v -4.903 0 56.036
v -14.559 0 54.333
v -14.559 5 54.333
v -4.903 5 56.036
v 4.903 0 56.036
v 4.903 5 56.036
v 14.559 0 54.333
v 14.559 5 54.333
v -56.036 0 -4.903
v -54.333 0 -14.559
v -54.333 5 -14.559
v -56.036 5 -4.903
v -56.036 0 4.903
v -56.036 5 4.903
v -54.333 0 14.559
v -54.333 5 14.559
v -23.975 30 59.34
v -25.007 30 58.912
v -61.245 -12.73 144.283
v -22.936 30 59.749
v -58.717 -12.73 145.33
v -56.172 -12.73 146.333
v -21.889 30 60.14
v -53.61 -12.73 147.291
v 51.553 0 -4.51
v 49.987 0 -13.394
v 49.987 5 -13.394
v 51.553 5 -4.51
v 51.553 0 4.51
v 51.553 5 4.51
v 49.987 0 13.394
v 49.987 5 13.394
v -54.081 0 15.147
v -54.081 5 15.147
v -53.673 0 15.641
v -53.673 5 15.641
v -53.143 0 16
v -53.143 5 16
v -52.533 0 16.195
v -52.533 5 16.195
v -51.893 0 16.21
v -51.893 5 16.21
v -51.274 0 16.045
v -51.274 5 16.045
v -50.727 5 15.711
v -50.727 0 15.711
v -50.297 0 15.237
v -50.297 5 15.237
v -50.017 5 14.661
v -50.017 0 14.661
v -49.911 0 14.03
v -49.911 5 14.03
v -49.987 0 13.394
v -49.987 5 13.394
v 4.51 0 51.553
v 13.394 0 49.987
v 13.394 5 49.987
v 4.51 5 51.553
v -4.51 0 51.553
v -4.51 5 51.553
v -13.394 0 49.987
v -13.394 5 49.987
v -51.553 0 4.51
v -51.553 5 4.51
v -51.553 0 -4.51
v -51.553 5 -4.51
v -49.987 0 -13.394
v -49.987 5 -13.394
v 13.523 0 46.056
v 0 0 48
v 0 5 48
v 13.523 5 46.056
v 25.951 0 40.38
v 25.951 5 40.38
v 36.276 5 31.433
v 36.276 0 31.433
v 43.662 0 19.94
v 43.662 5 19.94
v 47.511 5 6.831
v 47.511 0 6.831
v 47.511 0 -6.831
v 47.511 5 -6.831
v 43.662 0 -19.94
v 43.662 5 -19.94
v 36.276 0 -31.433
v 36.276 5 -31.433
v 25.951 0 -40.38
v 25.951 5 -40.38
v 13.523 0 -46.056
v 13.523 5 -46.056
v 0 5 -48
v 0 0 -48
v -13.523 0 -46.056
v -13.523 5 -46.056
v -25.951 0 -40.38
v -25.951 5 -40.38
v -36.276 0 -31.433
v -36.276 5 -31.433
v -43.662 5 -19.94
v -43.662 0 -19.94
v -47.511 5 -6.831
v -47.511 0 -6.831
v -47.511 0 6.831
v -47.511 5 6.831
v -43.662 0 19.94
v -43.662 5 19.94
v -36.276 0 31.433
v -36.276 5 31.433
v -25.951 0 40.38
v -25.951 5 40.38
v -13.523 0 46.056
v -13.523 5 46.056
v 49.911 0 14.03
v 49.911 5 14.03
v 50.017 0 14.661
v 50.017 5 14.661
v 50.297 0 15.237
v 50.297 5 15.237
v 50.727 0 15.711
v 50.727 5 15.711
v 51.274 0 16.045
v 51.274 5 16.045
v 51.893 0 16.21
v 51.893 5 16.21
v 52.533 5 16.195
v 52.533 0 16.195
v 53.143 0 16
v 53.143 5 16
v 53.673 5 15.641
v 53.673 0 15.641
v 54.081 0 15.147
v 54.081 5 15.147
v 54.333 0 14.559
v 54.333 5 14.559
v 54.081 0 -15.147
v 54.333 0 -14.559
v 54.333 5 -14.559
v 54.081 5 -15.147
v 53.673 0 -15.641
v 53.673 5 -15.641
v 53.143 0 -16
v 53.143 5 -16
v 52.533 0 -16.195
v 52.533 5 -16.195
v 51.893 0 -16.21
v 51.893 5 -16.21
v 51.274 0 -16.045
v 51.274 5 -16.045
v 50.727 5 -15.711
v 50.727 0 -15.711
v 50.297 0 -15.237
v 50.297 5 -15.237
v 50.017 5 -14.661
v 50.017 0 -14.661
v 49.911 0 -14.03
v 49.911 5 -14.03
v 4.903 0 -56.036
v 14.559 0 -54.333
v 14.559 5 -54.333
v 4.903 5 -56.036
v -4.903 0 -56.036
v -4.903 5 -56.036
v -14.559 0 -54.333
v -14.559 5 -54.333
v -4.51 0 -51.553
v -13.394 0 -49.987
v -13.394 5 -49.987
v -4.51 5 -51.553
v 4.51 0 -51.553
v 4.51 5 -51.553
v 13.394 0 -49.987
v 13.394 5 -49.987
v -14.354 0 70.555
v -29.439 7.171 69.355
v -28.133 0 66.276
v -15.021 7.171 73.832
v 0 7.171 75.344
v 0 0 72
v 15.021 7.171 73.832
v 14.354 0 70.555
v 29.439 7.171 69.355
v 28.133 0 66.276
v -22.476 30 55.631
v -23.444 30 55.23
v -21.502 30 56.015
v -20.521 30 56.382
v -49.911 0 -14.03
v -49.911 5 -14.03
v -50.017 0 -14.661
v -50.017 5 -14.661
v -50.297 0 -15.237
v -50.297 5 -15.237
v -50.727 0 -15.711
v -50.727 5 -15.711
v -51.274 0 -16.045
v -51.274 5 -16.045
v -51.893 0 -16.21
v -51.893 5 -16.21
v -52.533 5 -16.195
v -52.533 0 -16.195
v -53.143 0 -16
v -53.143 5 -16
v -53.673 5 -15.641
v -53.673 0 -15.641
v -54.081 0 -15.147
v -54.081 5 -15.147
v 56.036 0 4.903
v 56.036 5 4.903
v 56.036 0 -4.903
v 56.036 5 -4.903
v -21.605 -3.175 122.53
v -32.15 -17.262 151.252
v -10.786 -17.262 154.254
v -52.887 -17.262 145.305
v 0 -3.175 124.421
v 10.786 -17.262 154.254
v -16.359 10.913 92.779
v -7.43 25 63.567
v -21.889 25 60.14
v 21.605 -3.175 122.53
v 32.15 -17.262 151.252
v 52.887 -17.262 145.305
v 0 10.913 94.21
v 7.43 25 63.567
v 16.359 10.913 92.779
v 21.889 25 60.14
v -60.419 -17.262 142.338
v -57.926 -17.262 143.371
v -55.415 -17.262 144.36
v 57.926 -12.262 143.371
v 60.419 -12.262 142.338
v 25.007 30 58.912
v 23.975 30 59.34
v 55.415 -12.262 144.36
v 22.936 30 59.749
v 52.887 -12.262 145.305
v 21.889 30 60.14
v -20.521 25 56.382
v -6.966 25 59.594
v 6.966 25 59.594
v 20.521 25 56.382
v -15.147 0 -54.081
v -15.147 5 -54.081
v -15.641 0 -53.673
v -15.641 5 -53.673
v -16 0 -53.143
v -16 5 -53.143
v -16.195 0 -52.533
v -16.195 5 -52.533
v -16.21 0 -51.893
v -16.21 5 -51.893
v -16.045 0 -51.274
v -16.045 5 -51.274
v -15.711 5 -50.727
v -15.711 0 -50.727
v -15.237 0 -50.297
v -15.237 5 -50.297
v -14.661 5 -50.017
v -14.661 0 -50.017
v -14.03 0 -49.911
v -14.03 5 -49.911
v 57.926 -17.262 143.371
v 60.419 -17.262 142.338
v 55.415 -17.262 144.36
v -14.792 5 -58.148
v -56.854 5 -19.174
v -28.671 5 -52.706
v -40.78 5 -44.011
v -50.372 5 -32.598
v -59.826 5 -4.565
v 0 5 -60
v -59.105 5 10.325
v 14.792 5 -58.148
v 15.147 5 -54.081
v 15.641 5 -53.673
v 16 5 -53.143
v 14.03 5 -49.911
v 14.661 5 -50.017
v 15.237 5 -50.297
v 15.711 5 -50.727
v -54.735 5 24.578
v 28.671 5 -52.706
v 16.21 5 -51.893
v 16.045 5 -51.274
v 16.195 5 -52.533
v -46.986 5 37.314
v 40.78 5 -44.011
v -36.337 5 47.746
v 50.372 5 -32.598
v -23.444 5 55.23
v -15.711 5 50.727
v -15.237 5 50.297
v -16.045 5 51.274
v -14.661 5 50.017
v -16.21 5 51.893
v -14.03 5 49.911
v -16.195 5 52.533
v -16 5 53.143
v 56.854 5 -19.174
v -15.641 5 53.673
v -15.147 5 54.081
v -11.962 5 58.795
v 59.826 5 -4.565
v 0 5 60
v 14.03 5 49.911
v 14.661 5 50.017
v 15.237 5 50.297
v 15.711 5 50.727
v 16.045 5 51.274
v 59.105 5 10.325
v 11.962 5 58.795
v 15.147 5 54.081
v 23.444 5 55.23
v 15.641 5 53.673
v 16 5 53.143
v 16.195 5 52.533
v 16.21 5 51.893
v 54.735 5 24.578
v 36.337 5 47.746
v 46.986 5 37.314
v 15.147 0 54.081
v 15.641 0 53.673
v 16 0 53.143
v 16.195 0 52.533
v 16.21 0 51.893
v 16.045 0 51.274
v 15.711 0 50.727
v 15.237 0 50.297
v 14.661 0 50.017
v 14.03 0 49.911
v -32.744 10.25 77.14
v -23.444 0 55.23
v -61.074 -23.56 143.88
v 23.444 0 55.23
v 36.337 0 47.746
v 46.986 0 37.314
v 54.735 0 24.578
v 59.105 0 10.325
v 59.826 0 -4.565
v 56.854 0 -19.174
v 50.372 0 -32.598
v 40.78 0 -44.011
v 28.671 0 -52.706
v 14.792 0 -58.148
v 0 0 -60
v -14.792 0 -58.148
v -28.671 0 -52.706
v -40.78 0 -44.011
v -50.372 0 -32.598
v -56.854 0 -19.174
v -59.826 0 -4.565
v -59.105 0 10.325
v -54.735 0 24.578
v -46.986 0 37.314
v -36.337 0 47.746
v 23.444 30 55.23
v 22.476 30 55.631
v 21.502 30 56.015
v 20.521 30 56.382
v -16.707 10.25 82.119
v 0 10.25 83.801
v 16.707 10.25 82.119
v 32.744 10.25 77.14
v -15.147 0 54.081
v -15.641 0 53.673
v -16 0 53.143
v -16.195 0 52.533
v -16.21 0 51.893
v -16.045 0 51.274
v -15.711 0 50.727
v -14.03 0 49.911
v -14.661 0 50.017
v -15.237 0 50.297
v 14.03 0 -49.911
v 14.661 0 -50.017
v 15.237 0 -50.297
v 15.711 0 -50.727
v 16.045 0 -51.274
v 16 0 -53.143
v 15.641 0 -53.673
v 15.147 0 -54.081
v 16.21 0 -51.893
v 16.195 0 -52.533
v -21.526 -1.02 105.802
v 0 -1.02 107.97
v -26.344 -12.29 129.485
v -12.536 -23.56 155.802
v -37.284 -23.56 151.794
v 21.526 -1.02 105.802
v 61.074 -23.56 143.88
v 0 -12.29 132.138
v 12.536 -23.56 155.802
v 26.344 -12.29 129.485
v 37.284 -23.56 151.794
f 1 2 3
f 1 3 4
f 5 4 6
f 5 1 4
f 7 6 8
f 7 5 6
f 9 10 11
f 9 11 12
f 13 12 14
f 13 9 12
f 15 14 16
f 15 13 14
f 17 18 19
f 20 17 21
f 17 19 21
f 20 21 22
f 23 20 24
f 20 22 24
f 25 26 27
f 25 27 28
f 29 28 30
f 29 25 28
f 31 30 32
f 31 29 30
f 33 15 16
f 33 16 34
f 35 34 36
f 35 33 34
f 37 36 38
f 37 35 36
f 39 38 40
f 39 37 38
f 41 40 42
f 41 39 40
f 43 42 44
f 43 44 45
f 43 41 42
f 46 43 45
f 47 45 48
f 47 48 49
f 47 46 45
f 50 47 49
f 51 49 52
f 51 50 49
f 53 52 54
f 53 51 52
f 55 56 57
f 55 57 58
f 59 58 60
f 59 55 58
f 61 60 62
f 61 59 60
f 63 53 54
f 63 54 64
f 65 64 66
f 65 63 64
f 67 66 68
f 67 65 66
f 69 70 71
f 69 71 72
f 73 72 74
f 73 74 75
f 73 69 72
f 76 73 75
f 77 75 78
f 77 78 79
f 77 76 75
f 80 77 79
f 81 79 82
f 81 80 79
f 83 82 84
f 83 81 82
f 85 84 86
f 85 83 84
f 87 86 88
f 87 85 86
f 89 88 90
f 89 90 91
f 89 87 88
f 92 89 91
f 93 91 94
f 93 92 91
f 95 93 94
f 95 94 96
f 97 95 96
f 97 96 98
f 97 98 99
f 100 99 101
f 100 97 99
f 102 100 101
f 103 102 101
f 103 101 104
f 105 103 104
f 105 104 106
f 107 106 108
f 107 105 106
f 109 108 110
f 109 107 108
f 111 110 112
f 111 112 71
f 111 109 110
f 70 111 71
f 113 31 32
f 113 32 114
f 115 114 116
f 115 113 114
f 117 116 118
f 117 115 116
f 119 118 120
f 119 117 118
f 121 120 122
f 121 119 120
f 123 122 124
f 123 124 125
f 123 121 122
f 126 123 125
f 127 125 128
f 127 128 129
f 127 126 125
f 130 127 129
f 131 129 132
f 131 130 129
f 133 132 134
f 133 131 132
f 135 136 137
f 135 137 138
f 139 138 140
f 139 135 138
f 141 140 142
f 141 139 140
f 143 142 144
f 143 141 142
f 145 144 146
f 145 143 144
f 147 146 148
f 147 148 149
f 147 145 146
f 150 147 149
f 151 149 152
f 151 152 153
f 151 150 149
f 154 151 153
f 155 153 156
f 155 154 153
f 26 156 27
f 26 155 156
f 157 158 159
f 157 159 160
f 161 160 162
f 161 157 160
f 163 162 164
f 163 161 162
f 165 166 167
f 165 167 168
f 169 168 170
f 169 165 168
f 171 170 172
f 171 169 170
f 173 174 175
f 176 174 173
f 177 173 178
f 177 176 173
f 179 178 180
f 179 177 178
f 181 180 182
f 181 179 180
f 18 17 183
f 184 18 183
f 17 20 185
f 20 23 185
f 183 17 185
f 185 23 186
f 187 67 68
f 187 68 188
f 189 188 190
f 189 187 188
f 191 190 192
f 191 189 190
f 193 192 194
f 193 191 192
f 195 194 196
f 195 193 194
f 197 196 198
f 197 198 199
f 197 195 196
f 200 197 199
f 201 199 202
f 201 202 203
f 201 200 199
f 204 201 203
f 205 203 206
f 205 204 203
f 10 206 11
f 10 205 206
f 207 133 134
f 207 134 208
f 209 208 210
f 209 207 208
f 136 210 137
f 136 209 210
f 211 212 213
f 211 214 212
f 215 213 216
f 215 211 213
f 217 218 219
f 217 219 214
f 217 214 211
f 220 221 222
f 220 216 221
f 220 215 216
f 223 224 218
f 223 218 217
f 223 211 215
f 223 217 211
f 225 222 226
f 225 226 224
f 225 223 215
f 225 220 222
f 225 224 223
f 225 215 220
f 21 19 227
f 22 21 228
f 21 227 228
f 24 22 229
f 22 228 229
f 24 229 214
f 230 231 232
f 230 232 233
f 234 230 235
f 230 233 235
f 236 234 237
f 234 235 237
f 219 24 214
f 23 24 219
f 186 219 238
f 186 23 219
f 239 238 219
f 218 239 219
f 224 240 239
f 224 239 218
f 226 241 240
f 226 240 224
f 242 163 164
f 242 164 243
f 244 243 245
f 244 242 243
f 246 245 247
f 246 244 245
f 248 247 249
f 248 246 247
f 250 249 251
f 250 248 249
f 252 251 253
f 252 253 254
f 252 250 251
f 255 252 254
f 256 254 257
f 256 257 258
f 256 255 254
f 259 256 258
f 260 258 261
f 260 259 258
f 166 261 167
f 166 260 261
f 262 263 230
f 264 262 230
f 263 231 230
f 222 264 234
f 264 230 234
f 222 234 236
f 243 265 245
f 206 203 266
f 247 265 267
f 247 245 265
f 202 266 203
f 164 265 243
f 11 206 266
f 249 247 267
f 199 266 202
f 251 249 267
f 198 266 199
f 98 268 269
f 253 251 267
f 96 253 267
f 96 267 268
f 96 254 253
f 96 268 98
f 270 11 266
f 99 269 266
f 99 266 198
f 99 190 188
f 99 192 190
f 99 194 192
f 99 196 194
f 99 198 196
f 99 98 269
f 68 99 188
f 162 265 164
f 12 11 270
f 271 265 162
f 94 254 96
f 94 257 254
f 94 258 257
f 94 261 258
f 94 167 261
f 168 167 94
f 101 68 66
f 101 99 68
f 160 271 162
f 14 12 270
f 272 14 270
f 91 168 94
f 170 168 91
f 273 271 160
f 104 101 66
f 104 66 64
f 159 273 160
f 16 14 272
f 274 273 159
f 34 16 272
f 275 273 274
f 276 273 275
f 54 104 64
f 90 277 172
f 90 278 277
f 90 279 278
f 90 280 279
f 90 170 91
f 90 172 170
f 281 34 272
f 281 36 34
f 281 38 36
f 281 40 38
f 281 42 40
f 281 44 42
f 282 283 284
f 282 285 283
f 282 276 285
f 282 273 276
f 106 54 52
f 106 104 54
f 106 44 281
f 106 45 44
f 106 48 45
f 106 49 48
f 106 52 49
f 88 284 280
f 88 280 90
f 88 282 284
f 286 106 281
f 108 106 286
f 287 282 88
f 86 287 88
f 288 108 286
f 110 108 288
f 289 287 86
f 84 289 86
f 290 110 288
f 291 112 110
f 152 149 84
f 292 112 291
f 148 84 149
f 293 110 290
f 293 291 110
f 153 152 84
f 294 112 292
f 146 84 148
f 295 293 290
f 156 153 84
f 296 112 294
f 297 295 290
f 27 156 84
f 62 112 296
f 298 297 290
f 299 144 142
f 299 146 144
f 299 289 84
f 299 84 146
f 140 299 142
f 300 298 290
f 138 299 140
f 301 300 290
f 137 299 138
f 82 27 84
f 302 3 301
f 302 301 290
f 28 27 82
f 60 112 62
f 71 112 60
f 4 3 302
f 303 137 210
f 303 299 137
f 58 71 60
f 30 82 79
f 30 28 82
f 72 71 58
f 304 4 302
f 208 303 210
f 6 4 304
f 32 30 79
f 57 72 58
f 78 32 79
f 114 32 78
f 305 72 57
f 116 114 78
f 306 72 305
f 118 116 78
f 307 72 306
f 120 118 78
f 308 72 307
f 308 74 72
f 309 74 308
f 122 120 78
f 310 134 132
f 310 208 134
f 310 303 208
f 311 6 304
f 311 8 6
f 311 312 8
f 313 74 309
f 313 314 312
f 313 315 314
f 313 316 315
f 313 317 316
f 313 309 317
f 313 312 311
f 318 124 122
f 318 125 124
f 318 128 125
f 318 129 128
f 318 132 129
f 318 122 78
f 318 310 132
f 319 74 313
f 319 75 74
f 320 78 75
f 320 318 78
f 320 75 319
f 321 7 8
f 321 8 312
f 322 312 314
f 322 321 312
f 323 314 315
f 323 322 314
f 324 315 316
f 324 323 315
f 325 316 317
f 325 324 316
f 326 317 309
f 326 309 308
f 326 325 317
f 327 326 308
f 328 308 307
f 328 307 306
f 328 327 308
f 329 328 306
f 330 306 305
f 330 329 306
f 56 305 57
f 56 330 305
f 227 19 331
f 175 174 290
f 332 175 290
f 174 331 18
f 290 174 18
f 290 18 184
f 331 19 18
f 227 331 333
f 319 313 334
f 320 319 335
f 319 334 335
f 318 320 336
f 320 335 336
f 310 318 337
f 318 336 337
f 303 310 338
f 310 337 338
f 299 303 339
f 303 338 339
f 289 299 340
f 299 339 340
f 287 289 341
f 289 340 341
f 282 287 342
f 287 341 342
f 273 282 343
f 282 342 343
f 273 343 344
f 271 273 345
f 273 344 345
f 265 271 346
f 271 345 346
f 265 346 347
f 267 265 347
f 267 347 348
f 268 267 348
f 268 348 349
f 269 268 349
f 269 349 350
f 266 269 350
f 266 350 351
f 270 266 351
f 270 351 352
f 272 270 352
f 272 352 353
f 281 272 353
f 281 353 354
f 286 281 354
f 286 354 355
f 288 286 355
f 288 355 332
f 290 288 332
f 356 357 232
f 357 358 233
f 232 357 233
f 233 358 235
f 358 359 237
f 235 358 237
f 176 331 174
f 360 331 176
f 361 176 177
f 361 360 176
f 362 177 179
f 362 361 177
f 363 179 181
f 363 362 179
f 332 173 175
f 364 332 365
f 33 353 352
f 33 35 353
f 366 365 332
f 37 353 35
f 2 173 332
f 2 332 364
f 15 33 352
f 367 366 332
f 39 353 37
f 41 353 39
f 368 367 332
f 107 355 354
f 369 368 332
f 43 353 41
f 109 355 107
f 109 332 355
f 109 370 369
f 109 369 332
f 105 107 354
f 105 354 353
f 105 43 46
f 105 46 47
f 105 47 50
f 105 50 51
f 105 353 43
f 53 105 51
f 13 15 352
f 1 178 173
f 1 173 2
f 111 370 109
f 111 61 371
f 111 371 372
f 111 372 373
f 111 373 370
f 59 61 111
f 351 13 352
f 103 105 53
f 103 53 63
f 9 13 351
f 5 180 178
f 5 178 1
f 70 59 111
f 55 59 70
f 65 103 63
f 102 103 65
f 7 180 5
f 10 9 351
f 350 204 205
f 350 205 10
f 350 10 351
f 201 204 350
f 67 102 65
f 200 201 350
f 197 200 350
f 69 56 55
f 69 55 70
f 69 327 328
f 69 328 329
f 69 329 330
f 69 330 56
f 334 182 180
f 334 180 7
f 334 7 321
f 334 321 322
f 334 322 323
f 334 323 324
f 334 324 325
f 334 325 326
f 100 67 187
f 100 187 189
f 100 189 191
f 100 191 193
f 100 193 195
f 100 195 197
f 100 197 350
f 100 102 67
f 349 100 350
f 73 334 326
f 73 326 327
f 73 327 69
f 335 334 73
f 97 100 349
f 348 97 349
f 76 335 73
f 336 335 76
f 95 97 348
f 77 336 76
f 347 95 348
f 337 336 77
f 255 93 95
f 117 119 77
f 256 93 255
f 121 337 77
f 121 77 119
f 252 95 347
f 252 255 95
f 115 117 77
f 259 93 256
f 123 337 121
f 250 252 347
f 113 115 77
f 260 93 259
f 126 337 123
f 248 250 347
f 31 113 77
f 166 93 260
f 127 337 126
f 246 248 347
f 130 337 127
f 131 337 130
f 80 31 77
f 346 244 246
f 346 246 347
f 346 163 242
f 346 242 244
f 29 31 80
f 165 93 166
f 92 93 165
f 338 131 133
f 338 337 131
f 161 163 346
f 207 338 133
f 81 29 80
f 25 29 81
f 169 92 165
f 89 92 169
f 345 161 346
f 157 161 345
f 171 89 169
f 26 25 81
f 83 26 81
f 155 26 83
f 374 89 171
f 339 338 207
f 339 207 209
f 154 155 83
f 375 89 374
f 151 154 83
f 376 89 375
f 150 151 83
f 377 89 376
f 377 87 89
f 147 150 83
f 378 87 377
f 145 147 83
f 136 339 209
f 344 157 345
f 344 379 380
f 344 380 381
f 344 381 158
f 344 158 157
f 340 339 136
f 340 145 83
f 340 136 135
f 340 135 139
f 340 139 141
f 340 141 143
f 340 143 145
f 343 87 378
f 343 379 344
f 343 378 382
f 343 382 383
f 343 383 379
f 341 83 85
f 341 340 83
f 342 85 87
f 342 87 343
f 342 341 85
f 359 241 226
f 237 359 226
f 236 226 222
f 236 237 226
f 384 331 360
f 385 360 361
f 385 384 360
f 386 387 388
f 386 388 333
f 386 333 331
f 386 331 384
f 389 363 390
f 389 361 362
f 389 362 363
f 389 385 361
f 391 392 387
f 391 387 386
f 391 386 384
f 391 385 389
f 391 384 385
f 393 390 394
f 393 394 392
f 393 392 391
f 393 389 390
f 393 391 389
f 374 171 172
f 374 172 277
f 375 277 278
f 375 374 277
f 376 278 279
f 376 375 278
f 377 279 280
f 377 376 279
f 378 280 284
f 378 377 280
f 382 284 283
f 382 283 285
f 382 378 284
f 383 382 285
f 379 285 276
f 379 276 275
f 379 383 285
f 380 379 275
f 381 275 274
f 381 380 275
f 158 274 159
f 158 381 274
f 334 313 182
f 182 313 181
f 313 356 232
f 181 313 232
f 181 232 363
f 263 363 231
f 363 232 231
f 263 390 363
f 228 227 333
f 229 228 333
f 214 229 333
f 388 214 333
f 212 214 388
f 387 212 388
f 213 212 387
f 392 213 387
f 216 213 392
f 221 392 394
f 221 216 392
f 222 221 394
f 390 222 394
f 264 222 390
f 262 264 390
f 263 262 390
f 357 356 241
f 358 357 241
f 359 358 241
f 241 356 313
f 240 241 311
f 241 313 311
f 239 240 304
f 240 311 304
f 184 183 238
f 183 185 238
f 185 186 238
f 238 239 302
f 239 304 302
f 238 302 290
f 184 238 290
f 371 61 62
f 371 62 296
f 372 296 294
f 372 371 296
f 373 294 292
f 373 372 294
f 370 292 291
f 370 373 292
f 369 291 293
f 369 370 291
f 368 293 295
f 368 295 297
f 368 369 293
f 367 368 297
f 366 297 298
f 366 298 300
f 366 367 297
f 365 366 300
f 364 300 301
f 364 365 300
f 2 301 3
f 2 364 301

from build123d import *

# Parameters (mm, degrees)
SCHIZZO1_R                   = 60
SCHIZZO1_R_2                 = 48
ESTRUSIONE_ESTRUSIONE1_DEPTH = 5
RIVOLUZIONE1_ANGLE           = 23
RIVOLUZIONE1_OTHER_WAY_ANGLE = 23
RIVOLUZIONE2_ANGLE           = 3
RIVOLUZIONE3_ANGLE           = 3


with BuildPart() as part:
    # Schizzo1 → Estrusione-Estrusione1 (new body)
    with BuildSketch(Plane(origin=(0, 0, 0), x_dir=(1, 0, 0), z_dir=(0, 1, 0))):
        with Locations(Location((0, 0, 0), (0, 0, 270))):
            Circle(SCHIZZO1_R)
        with Locations(Location((0, 0, 0), (0, 0, 270))):
            Circle(SCHIZZO1_R_2, mode=Mode.SUBTRACT)
        with BuildLine():
            ThreePointArc((-14.558571287, -54.333327729), (0, -56.25), (14.558571287, -54.333327729))
            ThreePointArc((14.558571287, -54.333327729), (16.149561545, -51.577651768), (13.393885584, -49.98666151))
            ThreePointArc((13.393885584, -49.98666151), (0, -51.75), (-13.393885584, -49.98666151))
            ThreePointArc((-13.393885584, -49.98666151), (-16.149561545, -51.577651768), (-14.558571287, -54.333327729))
        make_face(mode=Mode.SUBTRACT)
        with BuildLine():
            ThreePointArc((13.393885584, 49.98666151), (16.149561545, 51.577651768), (14.558571287, 54.333327729))
            ThreePointArc((14.558571287, 54.333327729), (0, 56.25), (-14.558571287, 54.333327729))
            ThreePointArc((-14.558571287, 54.333327729), (-16.149561545, 51.577651768), (-13.393885584, 49.98666151))
            ThreePointArc((-13.393885584, 49.98666151), (0, 51.75), (13.393885584, 49.98666151))
        make_face(mode=Mode.SUBTRACT)
        with BuildLine():
            ThreePointArc((49.98666151, -13.393885584), (51.577651768, -16.149561545), (54.333327729, -14.558571287))
            ThreePointArc((54.333327729, -14.558571287), (56.25, 0), (54.333327729, 14.558571287))
            ThreePointArc((54.333327729, 14.558571287), (51.577651768, 16.149561545), (49.98666151, 13.393885584))
            ThreePointArc((49.98666151, 13.393885584), (51.75, 0), (49.98666151, -13.393885584))
        make_face(mode=Mode.SUBTRACT)
        with BuildLine():
            ThreePointArc((-49.98666151, 13.393885584), (-51.577651768, 16.149561545), (-54.333327729, 14.558571287))
            ThreePointArc((-54.333327729, 14.558571287), (-56.25, 0), (-54.333327729, -14.558571287))
            ThreePointArc((-54.333327729, -14.558571287), (-51.577651768, -16.149561545), (-49.98666151, -13.393885584))
            ThreePointArc((-49.98666151, -13.393885584), (-51.75, 0), (-49.98666151, 13.393885584))
        make_face(mode=Mode.SUBTRACT)
    extrude(amount=ESTRUSIONE_ESTRUSIONE1_DEPTH)

    # Schizzo2 → Rivoluzione1 (revolve)
    with BuildSketch(Plane.ZY):
        Polygon((83.801322108, 10.249602265), (156.30594507, -23.559858674), (154.630778704, -17.261826174), (64, 25), (60, 25), (60, 0), (72, 0), (75.34408852, 7.171420975), align=None)
    revolve(axis=Axis((0, 115.29923816, 0), (0, -1, 0)), revolution_arc=RIVOLUZIONE1_ANGLE)

    # Schizzo2 → Rivoluzione1 other way (revolve)
    with BuildSketch(Plane.ZY):
        Polygon((83.801322108, 10.249602265), (156.30594507, -23.559858674), (154.630778704, -17.261826174), (64, 25), (60, 25), (60, 0), (72, 0), (75.34408852, 7.171420975), align=None)
    revolve(axis=Axis((0, 115.29923816, 0), (0, 1, 0)), revolution_arc=RIVOLUZIONE1_OTHER_WAY_ANGLE)

    # Schizzo3 → Rivoluzione2 (revolve)
    with BuildSketch(Plane(origin=(0, 0, 0), x_dir=(-0.39073112848927466, 0, 0.92050485345244), z_dir=(-0.92050485345244, 0, -0.39073112848927466))):
        Polygon((60, 25), (60, 30), (64, 30), (156.743870012, -12.730287239), (154.630778704, -17.261826174), (64, 25), align=None)
    revolve(axis=Axis((0, 115.29923816, 0), (0, 1, 0)), revolution_arc=RIVOLUZIONE2_ANGLE)

    # Schizzo4 → Rivoluzione3 (revolve)
    with BuildSketch(Plane(origin=(0, 0, 0), x_dir=(-0.39073112848927455, 0, -0.92050485345244), z_dir=(0.92050485345244, 0, -0.39073112848927455))):
        Polygon((-60, 25), (-64, 25), (-154.630778704, -17.261826174), (-154.630778704, -12.261826174), (-64, 30), (-60, 30), align=None)
    revolve(axis=Axis((0, 115.29923816, 0), (0, -1, 0)), revolution_arc=RIVOLUZIONE3_ANGLE)


solid = part.part
